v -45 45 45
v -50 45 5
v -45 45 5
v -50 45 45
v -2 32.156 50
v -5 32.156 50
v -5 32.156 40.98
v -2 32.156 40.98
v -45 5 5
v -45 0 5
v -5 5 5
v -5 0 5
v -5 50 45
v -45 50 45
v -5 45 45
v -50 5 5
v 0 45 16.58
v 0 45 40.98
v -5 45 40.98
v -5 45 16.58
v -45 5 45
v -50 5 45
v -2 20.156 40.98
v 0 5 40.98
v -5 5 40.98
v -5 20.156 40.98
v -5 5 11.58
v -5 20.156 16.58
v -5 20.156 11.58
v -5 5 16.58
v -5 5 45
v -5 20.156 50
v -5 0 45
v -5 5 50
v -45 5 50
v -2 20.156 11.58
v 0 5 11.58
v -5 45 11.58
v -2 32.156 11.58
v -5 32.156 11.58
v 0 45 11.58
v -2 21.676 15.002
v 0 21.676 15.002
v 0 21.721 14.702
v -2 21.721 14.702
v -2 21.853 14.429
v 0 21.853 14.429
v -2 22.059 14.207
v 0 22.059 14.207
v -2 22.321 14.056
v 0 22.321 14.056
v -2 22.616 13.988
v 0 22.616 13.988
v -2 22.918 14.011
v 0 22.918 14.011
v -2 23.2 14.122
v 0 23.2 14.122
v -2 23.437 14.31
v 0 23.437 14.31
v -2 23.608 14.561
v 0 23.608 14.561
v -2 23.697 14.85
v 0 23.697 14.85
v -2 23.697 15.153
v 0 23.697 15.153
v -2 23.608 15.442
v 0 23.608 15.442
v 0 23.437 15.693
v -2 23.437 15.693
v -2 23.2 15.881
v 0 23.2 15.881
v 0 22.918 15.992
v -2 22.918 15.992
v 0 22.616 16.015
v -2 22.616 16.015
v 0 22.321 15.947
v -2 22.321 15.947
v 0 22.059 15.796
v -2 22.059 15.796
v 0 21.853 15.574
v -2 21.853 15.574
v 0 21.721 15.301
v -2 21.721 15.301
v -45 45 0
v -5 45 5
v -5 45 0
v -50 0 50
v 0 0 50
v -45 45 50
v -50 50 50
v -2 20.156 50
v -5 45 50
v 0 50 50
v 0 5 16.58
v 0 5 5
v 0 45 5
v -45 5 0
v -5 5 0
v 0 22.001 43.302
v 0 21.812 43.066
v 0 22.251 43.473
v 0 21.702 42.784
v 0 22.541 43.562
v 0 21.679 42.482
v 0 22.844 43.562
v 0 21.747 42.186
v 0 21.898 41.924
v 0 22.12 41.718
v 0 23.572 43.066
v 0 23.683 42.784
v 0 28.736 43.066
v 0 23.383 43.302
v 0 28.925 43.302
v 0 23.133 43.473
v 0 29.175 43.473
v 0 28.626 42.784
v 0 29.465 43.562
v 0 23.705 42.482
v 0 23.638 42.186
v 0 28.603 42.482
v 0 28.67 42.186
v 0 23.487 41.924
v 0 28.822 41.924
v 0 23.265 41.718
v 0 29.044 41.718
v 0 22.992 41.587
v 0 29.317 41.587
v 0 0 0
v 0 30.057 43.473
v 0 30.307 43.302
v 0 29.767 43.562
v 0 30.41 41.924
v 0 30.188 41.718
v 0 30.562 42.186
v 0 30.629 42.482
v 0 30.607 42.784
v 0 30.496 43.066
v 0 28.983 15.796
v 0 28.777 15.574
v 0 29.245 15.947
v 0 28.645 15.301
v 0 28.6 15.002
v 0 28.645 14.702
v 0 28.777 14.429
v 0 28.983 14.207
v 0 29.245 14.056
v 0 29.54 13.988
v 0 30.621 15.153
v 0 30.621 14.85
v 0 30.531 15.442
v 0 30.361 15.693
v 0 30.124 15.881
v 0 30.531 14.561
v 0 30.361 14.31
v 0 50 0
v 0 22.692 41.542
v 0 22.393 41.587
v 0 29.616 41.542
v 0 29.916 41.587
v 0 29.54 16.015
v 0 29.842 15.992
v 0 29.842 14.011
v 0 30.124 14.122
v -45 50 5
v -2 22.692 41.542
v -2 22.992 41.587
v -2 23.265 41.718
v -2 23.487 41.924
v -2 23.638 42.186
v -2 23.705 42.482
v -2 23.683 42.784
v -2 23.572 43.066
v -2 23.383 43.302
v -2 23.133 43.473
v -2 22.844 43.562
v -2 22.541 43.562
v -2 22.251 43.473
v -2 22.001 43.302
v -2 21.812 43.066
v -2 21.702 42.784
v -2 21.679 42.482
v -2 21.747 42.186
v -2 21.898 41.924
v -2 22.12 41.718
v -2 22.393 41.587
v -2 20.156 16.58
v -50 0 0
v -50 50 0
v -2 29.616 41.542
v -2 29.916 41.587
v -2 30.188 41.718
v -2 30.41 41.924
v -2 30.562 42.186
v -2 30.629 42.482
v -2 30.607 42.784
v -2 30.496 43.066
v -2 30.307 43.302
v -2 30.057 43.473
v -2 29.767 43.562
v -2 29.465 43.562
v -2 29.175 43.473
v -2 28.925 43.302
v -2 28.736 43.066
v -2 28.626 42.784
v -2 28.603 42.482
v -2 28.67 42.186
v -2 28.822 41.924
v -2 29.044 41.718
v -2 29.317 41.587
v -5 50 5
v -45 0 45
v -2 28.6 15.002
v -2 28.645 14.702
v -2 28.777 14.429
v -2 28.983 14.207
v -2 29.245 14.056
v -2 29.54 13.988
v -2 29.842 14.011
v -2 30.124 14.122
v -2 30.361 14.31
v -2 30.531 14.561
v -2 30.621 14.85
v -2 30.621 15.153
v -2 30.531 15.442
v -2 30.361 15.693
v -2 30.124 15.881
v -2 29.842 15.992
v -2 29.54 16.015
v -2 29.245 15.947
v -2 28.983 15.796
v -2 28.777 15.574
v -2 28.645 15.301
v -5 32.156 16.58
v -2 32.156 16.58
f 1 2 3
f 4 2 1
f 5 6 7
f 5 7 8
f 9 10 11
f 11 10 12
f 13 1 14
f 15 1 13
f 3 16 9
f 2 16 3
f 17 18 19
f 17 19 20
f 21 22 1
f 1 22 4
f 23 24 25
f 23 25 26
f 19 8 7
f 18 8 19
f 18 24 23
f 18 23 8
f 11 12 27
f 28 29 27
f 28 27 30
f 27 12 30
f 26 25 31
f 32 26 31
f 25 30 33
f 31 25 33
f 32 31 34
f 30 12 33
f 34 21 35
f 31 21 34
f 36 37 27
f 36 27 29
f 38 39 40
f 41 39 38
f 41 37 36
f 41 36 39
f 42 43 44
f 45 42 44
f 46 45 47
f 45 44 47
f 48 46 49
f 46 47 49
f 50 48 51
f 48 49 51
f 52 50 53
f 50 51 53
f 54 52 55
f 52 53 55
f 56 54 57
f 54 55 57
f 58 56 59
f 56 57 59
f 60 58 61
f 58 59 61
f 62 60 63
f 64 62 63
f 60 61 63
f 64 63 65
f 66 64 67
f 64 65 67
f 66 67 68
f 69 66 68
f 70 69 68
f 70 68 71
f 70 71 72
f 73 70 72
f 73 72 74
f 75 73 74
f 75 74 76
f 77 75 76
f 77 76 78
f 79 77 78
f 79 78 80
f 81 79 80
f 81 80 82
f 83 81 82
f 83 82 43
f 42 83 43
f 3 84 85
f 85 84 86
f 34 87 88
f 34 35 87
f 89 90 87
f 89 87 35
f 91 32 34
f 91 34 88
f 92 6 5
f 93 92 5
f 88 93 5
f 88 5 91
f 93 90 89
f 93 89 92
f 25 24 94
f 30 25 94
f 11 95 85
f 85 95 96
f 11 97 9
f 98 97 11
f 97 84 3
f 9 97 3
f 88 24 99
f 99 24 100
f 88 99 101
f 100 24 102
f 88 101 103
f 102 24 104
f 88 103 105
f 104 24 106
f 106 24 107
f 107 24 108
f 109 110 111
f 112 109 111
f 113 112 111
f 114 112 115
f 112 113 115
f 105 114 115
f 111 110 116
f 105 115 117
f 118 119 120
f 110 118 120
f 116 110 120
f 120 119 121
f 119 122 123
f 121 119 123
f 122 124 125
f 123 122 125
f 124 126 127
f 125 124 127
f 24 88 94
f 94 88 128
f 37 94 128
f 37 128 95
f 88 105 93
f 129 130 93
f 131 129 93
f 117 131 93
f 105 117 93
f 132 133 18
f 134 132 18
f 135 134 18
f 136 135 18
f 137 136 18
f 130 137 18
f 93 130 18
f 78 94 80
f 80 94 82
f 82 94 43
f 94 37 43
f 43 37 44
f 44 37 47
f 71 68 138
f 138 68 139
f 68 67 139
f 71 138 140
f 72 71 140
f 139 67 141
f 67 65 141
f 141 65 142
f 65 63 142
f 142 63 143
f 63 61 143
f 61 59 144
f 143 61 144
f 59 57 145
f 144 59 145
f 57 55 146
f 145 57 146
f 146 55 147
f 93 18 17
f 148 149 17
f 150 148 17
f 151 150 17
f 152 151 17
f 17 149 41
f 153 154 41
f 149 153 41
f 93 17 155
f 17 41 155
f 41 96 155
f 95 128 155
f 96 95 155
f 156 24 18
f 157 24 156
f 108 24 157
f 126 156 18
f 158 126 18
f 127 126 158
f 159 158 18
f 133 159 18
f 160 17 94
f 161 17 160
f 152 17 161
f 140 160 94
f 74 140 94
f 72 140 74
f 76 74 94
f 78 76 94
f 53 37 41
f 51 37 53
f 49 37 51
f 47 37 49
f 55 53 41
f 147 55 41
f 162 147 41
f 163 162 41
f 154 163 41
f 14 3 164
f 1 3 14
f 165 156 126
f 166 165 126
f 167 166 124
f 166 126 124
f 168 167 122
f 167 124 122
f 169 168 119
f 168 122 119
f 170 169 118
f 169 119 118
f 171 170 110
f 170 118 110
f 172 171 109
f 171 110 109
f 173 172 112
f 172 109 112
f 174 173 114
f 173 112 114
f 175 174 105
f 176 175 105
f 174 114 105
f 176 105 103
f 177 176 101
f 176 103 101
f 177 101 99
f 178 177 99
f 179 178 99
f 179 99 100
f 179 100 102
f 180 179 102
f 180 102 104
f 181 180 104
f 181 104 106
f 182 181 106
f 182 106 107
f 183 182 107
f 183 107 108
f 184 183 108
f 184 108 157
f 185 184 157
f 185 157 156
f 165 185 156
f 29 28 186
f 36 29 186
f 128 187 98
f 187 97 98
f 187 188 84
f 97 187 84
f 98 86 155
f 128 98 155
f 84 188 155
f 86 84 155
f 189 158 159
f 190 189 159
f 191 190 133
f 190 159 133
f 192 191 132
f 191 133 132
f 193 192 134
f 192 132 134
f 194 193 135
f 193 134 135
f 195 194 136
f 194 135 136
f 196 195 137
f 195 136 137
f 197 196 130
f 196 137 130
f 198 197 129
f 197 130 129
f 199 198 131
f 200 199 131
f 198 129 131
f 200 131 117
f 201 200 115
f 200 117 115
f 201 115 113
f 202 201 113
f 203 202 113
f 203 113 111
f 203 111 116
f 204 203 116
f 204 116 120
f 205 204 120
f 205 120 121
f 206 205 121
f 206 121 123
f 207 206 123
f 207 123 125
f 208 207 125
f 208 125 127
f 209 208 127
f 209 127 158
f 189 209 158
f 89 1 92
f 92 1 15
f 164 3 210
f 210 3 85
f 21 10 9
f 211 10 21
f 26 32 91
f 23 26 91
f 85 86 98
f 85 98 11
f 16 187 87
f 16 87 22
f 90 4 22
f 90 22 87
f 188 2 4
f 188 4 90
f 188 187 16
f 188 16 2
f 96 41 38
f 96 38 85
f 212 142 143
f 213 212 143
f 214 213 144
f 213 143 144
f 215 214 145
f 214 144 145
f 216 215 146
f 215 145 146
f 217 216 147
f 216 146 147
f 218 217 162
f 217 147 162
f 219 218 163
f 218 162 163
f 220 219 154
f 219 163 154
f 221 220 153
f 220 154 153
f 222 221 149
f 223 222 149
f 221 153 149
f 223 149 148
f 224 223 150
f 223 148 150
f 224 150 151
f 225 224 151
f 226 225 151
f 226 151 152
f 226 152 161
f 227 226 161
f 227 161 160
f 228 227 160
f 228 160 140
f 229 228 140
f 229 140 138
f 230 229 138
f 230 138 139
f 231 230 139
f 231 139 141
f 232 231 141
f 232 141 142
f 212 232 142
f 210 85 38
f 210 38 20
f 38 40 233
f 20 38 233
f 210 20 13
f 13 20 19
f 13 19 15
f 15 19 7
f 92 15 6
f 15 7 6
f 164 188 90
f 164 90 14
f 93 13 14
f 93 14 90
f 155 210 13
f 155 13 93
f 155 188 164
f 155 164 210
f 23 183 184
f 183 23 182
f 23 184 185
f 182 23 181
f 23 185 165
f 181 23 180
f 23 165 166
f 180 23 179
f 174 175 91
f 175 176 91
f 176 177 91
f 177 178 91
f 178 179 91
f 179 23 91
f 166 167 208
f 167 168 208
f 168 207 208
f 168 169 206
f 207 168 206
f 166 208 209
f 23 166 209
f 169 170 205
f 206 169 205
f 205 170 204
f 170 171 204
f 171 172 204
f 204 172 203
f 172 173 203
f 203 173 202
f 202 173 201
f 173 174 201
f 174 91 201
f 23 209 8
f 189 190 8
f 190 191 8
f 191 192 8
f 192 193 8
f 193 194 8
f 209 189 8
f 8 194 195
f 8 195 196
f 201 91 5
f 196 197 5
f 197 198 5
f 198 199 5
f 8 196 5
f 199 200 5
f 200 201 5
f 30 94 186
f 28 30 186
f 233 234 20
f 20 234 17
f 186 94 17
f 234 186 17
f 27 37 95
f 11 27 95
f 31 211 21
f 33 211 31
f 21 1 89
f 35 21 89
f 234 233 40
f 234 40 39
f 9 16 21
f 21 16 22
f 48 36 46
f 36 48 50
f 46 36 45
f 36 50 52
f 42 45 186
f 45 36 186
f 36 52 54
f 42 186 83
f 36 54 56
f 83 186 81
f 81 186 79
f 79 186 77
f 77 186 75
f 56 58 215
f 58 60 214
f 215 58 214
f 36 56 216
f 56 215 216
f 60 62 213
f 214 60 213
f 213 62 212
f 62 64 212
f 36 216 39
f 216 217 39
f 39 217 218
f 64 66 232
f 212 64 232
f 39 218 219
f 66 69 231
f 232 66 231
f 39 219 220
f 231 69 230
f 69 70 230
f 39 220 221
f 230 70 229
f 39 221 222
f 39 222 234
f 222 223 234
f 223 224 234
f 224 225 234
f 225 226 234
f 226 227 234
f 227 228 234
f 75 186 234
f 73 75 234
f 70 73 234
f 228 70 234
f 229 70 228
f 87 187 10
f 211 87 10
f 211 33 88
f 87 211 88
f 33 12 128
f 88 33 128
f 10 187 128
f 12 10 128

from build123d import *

# Parameters (mm, degrees)
SKETCH1_W          = 50
SKETCH1_H          = 50
SKETCH1_W_2        = 40
SKETCH1_H_2        = 40
EXTRUDE1_DEPTH     = 50
SKETCH2_W          = 40
SKETCH2_H          = 40
CUT_EXTRUDE1_DEPTH = 50
SKETCH3_W          = 40
SKETCH3_H          = 40
CUT_EXTRUDE2_DEPTH = 10
SKETCH4_W          = 24.4
SKETCH4_H          = 40
SKETCH4_W_2        = 6.57952911
CUT_EXTRUDE3_DEPTH = 10
SKETCH5_R          = 1.016
CUT_EXTRUDE4_DEPTH = 10
SKETCH6_W          = 3
SKETCH6_H          = 12
CUT_EXTRUDE5_DEPTH = 40


with BuildPart() as part:
    # Sketch1 → Extrude1 (new body)
    with BuildSketch(Plane.XY):
        with Locations((-25, 25)):
            Rectangle(SKETCH1_W, SKETCH1_H)
        with Locations((-25, 25)):
            Rectangle(SKETCH1_W_2, SKETCH1_H_2, mode=Mode.SUBTRACT)
    extrude(amount=EXTRUDE1_DEPTH)

    # Sketch2 → Cut-Extrude1 (cut)
    with BuildSketch(Plane.XZ):
        with Locations((-25, 25)):
            Rectangle(SKETCH2_W, SKETCH2_H)
    extrude(amount=-CUT_EXTRUDE1_DEPTH, mode=Mode.SUBTRACT)

    # Sketch3 → Cut-Extrude2 (cut)
    with BuildSketch(Plane.ZY.offset(50)):
        with Locations((25, 25)):
            Rectangle(SKETCH3_W, SKETCH3_H)
    extrude(amount=-CUT_EXTRUDE2_DEPTH, mode=Mode.SUBTRACT)

    # Sketch4 → Cut-Extrude3 (cut)
    with BuildSketch(Plane(origin=(0, 0, 0), x_dir=(0, 0, -1), z_dir=(1, 0, 0))):
        with Locations((-28.77952911, 25)):
            Rectangle(SKETCH4_W, SKETCH4_H)
        with Locations((-8.289764555, 25)):
            Rectangle(SKETCH4_W_2, SKETCH4_H)
    extrude(amount=-CUT_EXTRUDE3_DEPTH, mode=Mode.SUBTRACT)

    # Sketch5 → Cut-Extrude4 (cut)
    with BuildSketch(Plane(origin=(0, 0, 0), x_dir=(0, 0, -1), z_dir=(1, 0, 0))):
        with Locations((-42.55752911, 29.616065633)):
            Circle(SKETCH5_R)
        with Locations((-42.55752911, 22.692268102)):
            Circle(SKETCH5_R)
        with Locations((-15.00152911, 22.692268102)):
            Circle(SKETCH5_R)
        with Locations((-15.00152911, 29.616065633)):
            Circle(SKETCH5_R)
    extrude(amount=-CUT_EXTRUDE4_DEPTH, mode=Mode.SUBTRACT)

    # Sketch6 → Cut-Extrude5 (cut)
    with BuildSketch(Plane.XY.offset(50)):
        with Locations((-3.5, 26.156065633)):
            Rectangle(SKETCH6_W, SKETCH6_H)
    extrude(amount=-CUT_EXTRUDE5_DEPTH, mode=Mode.SUBTRACT)


solid = part.part
